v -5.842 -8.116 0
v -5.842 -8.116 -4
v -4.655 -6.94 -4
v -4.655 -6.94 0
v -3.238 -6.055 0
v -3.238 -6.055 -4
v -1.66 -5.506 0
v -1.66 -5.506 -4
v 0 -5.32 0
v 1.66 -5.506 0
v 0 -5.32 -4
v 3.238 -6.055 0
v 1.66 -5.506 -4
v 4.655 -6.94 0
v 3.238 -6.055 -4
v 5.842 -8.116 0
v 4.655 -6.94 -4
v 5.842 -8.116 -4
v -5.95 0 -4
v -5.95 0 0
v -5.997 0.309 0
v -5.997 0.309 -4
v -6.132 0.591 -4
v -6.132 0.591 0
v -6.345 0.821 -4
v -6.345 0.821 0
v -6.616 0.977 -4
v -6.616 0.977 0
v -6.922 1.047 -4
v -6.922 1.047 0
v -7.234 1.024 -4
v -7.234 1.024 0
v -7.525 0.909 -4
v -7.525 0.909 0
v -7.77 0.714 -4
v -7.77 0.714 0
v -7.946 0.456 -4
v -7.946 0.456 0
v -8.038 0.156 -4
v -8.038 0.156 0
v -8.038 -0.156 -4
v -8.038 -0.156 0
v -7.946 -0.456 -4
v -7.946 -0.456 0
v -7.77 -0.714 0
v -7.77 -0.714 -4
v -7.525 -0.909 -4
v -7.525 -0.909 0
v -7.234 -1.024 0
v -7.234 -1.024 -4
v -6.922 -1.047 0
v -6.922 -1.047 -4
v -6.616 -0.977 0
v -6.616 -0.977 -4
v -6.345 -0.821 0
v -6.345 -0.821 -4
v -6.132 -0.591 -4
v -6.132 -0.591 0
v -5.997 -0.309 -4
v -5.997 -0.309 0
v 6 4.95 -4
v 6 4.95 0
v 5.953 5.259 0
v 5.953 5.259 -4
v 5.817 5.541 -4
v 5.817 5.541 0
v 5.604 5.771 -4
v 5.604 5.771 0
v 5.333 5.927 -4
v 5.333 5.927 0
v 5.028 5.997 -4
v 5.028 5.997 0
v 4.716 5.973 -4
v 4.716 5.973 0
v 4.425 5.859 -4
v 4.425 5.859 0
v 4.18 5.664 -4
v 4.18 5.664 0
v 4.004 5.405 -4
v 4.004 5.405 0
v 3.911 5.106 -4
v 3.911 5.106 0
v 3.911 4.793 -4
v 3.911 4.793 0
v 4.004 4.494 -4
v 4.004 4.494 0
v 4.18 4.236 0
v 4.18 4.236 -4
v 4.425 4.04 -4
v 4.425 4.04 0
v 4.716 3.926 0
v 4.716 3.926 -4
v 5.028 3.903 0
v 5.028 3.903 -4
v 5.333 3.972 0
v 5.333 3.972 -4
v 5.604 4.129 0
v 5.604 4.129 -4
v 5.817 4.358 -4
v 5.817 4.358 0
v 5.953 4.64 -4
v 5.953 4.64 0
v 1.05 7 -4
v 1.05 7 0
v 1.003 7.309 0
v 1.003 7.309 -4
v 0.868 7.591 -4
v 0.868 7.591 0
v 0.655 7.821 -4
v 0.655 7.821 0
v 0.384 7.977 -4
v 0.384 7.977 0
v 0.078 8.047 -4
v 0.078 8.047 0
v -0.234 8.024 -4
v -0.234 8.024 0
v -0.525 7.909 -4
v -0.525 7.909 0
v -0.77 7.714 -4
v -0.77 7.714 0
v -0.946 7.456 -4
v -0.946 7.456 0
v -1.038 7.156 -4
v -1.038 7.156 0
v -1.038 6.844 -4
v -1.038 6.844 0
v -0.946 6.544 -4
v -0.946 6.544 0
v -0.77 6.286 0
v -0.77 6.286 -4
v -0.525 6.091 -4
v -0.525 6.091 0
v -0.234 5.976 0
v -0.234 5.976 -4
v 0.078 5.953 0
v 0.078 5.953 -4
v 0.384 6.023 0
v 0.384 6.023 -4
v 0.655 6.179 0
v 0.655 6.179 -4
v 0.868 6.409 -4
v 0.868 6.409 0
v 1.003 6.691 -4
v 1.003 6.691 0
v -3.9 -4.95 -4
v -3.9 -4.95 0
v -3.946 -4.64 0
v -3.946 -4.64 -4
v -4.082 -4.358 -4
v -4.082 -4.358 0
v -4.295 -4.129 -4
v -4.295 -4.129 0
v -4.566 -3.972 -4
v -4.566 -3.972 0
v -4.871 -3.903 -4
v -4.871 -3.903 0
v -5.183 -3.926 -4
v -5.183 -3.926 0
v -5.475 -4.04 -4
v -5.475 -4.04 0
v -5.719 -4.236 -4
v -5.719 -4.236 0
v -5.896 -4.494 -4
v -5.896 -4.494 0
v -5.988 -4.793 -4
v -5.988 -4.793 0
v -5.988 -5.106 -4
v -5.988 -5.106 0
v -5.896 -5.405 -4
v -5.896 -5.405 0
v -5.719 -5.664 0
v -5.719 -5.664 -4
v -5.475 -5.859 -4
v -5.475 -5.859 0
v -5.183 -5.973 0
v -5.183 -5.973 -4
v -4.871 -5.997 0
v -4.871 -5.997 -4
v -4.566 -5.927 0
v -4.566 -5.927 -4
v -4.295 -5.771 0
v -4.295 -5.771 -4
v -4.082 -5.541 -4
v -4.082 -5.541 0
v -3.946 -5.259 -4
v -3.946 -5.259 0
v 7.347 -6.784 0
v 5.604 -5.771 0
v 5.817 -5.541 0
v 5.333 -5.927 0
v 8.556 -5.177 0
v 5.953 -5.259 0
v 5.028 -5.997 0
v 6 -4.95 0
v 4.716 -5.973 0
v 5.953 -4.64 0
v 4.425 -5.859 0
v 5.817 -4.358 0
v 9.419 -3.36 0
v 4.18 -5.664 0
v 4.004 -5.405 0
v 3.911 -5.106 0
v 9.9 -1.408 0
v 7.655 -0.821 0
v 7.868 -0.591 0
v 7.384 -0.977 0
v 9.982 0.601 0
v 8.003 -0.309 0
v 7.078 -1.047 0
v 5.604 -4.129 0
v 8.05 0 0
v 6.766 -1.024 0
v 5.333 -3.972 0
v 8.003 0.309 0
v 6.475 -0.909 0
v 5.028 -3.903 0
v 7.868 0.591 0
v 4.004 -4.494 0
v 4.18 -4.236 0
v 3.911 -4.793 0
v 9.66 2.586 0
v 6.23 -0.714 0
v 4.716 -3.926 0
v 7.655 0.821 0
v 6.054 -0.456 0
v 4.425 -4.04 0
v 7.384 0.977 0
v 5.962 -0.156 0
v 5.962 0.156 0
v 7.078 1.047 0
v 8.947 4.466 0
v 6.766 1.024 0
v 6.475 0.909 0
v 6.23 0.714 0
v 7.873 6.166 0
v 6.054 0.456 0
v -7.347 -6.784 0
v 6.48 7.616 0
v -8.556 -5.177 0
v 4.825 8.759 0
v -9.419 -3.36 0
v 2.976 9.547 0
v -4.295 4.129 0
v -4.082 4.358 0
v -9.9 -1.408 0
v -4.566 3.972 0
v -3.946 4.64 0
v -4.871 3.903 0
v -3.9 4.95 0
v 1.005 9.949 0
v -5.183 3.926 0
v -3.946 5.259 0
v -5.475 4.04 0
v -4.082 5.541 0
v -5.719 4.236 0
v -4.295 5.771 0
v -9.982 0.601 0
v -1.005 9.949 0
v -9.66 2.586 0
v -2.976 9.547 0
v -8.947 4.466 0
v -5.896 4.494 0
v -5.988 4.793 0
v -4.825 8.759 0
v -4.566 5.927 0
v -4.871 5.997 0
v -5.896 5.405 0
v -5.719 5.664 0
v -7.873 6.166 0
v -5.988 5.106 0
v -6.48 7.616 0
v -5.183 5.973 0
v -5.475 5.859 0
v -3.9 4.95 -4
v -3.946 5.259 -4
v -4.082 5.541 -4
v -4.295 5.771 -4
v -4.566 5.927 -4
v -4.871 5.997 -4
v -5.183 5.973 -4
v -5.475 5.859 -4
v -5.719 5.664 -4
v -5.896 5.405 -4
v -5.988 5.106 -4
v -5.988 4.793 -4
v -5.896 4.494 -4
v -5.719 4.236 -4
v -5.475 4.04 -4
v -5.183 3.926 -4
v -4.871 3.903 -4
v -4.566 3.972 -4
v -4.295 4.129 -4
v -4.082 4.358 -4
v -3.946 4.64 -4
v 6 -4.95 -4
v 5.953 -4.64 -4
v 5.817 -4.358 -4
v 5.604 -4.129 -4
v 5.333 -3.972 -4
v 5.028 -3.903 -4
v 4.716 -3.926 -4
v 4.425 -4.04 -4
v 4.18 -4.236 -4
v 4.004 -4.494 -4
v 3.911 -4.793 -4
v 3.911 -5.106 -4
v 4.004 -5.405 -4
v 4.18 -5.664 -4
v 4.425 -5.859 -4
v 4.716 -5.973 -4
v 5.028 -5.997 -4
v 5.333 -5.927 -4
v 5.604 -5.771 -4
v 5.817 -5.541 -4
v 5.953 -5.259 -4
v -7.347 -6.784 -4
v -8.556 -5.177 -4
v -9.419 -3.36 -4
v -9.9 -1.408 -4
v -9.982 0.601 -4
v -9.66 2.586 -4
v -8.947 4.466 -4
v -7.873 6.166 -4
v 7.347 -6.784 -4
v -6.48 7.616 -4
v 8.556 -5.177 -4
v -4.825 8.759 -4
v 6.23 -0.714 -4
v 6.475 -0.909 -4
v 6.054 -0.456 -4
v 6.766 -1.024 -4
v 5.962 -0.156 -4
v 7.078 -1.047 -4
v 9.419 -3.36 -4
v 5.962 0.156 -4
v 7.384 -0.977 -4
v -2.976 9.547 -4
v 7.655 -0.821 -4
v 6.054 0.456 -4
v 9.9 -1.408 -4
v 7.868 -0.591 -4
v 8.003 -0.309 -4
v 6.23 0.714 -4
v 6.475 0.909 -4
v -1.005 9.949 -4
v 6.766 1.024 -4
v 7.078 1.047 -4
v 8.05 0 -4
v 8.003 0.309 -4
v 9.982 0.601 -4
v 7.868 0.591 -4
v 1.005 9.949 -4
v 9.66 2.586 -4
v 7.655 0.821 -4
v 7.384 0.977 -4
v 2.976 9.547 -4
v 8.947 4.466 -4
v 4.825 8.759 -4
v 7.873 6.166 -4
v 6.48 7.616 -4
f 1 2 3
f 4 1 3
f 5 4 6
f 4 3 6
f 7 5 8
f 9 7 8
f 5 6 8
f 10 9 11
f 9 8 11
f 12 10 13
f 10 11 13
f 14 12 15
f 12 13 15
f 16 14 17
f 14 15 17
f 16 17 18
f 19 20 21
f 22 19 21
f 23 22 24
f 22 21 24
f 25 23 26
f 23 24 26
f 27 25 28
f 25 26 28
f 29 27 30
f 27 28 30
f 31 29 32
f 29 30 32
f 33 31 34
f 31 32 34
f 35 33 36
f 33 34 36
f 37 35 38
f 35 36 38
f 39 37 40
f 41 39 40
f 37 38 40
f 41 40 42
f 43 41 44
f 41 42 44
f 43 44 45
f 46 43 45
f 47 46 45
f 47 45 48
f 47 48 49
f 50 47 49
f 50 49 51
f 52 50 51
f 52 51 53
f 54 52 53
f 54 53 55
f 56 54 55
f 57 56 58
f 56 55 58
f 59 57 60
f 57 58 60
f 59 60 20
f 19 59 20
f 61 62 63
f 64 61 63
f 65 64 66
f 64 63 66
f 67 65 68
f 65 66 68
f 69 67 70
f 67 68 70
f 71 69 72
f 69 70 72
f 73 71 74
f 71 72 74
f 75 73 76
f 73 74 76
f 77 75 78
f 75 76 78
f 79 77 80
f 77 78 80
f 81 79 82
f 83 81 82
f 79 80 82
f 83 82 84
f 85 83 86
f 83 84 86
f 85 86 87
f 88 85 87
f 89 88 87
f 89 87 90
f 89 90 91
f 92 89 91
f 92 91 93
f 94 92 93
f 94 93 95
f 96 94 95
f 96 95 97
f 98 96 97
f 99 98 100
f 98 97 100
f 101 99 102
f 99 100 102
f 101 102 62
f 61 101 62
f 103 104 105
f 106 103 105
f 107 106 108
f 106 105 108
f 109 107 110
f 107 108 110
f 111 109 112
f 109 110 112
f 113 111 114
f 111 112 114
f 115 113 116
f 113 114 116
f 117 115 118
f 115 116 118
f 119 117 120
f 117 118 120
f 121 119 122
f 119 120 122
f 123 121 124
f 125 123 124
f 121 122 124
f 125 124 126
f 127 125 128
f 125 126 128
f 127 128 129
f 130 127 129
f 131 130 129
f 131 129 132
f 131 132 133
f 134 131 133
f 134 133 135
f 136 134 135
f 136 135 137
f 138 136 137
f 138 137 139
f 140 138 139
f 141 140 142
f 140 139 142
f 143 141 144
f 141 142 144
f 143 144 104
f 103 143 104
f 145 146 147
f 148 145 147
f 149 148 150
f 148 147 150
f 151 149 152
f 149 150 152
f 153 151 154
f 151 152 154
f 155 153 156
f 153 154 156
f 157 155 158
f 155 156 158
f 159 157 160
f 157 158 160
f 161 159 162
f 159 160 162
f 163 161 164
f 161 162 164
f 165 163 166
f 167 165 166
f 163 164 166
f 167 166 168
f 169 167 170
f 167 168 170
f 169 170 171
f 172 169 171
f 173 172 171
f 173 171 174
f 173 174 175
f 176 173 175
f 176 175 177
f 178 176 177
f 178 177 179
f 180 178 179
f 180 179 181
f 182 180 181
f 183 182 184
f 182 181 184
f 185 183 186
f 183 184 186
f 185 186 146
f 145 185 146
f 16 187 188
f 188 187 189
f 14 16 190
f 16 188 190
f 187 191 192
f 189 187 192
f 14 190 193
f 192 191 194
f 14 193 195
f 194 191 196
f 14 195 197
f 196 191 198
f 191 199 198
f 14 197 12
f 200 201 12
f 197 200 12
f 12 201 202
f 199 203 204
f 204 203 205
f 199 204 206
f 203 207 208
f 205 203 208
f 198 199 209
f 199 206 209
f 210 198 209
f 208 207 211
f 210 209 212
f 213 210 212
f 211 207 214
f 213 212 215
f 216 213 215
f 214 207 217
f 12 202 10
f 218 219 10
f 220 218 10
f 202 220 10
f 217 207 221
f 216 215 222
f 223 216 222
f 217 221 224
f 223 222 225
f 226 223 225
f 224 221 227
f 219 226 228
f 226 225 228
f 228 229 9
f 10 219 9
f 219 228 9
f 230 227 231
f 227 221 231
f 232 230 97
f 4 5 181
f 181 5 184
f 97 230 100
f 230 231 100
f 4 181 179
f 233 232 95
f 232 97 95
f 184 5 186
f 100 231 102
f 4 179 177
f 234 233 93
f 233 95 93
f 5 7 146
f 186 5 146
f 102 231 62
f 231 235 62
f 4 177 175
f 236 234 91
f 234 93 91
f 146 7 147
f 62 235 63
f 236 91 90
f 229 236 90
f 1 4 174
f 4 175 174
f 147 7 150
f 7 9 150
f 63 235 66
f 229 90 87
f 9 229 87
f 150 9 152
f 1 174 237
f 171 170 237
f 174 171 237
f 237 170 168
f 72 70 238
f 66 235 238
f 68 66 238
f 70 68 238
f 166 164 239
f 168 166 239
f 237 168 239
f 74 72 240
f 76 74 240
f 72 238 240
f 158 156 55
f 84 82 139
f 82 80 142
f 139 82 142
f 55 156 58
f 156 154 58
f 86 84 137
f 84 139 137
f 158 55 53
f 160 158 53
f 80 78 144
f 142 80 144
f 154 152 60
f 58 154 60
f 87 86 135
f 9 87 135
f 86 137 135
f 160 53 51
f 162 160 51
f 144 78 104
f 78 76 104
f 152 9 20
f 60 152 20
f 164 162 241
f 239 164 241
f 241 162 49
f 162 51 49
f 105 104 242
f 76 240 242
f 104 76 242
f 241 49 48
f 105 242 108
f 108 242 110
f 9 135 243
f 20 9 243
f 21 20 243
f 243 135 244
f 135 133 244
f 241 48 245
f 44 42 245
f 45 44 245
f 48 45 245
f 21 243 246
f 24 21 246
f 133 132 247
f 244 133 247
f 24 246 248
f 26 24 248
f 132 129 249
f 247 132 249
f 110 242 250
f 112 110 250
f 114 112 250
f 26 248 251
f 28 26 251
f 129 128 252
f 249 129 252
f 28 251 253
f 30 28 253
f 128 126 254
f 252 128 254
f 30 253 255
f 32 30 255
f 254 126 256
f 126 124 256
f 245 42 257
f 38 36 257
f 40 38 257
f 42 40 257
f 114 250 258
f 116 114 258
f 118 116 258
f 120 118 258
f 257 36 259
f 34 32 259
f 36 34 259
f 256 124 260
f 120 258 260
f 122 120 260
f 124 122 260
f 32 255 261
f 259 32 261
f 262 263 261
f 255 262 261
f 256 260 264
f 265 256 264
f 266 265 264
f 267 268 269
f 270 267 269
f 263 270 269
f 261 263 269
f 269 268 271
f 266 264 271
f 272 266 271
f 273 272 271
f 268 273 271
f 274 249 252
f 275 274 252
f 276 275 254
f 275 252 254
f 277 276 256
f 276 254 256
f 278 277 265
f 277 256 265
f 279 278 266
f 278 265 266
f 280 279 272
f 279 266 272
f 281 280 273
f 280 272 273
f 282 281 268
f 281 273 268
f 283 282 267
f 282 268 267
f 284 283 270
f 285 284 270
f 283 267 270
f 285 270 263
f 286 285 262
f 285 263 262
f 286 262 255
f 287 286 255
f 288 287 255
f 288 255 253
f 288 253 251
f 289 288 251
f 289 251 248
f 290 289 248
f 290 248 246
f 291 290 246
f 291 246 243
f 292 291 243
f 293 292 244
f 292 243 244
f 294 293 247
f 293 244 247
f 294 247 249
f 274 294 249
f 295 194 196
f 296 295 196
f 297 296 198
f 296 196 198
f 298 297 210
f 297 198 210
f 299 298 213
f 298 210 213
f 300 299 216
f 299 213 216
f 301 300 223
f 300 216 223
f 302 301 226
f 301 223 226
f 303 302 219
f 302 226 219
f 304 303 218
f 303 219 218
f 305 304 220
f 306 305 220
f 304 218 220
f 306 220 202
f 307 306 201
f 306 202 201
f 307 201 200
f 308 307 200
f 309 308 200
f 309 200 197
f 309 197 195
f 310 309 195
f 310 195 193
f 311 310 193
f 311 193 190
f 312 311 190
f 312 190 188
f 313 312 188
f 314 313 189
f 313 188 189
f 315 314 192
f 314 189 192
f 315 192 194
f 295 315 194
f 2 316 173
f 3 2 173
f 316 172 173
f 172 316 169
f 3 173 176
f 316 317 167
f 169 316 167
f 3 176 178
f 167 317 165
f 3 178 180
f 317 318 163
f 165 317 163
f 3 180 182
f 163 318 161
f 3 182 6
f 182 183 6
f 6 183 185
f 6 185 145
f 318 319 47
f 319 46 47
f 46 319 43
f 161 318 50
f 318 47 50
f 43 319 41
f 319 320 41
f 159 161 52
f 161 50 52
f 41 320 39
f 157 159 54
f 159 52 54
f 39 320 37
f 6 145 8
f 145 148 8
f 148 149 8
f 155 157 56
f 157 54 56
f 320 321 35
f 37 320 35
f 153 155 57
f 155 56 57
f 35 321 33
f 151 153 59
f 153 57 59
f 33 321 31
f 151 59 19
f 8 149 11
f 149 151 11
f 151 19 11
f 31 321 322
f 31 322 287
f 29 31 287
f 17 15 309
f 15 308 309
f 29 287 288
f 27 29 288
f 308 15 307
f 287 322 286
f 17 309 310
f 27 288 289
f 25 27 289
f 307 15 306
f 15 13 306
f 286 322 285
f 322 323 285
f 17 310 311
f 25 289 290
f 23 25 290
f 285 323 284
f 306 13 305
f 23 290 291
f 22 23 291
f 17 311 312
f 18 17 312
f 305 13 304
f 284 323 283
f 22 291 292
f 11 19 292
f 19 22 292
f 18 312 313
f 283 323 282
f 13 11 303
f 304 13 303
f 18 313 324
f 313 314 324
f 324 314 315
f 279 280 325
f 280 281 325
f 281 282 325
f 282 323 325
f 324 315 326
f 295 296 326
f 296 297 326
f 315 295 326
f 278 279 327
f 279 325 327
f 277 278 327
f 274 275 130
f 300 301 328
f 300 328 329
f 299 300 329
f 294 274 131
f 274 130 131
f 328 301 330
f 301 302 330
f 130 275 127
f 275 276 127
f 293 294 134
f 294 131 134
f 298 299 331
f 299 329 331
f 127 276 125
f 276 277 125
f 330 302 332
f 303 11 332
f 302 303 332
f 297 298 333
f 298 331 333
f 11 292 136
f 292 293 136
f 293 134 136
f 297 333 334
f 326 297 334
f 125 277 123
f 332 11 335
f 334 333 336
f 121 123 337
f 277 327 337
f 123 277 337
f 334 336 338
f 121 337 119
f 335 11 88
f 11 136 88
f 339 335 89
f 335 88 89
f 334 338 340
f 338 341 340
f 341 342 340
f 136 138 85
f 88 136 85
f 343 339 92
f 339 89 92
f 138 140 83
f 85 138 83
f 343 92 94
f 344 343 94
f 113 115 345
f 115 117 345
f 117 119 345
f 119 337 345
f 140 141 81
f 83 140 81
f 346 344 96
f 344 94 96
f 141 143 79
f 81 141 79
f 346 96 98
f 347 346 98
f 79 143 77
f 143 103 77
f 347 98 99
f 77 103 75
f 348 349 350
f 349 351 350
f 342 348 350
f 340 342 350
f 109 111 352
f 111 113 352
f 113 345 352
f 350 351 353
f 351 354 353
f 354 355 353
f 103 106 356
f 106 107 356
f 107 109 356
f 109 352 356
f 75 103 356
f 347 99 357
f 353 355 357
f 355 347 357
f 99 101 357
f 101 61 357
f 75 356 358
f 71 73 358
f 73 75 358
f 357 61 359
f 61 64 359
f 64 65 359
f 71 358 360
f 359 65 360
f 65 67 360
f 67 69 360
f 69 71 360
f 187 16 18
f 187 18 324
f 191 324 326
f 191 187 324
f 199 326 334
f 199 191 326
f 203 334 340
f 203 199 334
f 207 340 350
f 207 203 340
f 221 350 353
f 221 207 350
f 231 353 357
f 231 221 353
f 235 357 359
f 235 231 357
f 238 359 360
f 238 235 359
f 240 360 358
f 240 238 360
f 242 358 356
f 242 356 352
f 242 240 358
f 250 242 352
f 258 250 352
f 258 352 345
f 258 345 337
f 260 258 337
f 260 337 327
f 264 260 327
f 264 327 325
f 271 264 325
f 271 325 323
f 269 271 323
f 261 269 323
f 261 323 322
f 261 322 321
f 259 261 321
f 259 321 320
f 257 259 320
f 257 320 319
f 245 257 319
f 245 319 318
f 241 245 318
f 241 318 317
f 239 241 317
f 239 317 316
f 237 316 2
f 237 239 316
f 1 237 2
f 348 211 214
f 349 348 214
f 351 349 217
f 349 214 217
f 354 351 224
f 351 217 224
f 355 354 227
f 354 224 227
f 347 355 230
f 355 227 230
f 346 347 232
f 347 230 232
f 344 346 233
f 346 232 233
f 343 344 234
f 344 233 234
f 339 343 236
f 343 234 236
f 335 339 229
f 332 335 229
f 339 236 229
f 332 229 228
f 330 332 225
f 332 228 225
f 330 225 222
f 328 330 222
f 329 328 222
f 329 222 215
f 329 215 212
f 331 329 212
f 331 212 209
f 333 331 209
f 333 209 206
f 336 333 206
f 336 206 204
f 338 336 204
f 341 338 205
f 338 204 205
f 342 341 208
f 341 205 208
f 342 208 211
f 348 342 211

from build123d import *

# Parameters (mm, degrees)
SKETCH1_R           = 10
SKETCH1_R_2         = 1.05
SKETCH1_R_3         = 4
BOSS_EXTRUDE1_DEPTH = 4
SKETCH2_R           = 7.5
CUT_EXTRUDE1_DEPTH  = 10
BOSS_EXTRUDE2_START = -4
SKETCH3_R           = 4
BOSS_EXTRUDE2_DEPTH = 4


with BuildPart() as part:
    # Sketch1 → Boss-Extrude1 (new body)
    with BuildSketch(Plane.XY):
        Circle(SKETCH1_R)
        with Locations((-7, 0)):
            Circle(SKETCH1_R_2, mode=Mode.SUBTRACT)
        with Locations((0, 7)):
            Circle(SKETCH1_R_2, mode=Mode.SUBTRACT)
        with Locations((7, 0)):
            Circle(SKETCH1_R_2, mode=Mode.SUBTRACT)
        with Locations((4.949747468, 4.949747468)):
            Circle(SKETCH1_R_2, mode=Mode.SUBTRACT)
        with Locations((4.949747468, -4.949747468)):
            Circle(SKETCH1_R_2, mode=Mode.SUBTRACT)
        with Locations((0, -7)):
            Circle(SKETCH1_R_2, mode=Mode.SUBTRACT)
        with Locations((-4.949747468, -4.949747468)):
            Circle(SKETCH1_R_2, mode=Mode.SUBTRACT)
        with Locations((-4.949747468, 4.949747468)):
            Circle(SKETCH1_R_2, mode=Mode.SUBTRACT)
        Circle(SKETCH1_R_3, mode=Mode.SUBTRACT)
    extrude(amount=-BOSS_EXTRUDE1_DEPTH)

    # Sketch2 → Cut-Extrude1 (cut)
    with BuildSketch(Plane(origin=(0, 0, -4), x_dir=(-1, 0, 0), z_dir=(0, 0, -1))):
        with Locations((0, -12.82)):
            Circle(SKETCH2_R)
    extrude(amount=-CUT_EXTRUDE1_DEPTH, mode=Mode.SUBTRACT)

    # Sketch3 → Boss-Extrude2 (add)
    with BuildSketch(Plane(origin=(0, 0, -4), x_dir=(-1, 0, 0), z_dir=(0, 0, -1)).offset(BOSS_EXTRUDE2_START)):
        Circle(SKETCH3_R)
    extrude(amount=BOSS_EXTRUDE2_DEPTH)


solid = part.part
